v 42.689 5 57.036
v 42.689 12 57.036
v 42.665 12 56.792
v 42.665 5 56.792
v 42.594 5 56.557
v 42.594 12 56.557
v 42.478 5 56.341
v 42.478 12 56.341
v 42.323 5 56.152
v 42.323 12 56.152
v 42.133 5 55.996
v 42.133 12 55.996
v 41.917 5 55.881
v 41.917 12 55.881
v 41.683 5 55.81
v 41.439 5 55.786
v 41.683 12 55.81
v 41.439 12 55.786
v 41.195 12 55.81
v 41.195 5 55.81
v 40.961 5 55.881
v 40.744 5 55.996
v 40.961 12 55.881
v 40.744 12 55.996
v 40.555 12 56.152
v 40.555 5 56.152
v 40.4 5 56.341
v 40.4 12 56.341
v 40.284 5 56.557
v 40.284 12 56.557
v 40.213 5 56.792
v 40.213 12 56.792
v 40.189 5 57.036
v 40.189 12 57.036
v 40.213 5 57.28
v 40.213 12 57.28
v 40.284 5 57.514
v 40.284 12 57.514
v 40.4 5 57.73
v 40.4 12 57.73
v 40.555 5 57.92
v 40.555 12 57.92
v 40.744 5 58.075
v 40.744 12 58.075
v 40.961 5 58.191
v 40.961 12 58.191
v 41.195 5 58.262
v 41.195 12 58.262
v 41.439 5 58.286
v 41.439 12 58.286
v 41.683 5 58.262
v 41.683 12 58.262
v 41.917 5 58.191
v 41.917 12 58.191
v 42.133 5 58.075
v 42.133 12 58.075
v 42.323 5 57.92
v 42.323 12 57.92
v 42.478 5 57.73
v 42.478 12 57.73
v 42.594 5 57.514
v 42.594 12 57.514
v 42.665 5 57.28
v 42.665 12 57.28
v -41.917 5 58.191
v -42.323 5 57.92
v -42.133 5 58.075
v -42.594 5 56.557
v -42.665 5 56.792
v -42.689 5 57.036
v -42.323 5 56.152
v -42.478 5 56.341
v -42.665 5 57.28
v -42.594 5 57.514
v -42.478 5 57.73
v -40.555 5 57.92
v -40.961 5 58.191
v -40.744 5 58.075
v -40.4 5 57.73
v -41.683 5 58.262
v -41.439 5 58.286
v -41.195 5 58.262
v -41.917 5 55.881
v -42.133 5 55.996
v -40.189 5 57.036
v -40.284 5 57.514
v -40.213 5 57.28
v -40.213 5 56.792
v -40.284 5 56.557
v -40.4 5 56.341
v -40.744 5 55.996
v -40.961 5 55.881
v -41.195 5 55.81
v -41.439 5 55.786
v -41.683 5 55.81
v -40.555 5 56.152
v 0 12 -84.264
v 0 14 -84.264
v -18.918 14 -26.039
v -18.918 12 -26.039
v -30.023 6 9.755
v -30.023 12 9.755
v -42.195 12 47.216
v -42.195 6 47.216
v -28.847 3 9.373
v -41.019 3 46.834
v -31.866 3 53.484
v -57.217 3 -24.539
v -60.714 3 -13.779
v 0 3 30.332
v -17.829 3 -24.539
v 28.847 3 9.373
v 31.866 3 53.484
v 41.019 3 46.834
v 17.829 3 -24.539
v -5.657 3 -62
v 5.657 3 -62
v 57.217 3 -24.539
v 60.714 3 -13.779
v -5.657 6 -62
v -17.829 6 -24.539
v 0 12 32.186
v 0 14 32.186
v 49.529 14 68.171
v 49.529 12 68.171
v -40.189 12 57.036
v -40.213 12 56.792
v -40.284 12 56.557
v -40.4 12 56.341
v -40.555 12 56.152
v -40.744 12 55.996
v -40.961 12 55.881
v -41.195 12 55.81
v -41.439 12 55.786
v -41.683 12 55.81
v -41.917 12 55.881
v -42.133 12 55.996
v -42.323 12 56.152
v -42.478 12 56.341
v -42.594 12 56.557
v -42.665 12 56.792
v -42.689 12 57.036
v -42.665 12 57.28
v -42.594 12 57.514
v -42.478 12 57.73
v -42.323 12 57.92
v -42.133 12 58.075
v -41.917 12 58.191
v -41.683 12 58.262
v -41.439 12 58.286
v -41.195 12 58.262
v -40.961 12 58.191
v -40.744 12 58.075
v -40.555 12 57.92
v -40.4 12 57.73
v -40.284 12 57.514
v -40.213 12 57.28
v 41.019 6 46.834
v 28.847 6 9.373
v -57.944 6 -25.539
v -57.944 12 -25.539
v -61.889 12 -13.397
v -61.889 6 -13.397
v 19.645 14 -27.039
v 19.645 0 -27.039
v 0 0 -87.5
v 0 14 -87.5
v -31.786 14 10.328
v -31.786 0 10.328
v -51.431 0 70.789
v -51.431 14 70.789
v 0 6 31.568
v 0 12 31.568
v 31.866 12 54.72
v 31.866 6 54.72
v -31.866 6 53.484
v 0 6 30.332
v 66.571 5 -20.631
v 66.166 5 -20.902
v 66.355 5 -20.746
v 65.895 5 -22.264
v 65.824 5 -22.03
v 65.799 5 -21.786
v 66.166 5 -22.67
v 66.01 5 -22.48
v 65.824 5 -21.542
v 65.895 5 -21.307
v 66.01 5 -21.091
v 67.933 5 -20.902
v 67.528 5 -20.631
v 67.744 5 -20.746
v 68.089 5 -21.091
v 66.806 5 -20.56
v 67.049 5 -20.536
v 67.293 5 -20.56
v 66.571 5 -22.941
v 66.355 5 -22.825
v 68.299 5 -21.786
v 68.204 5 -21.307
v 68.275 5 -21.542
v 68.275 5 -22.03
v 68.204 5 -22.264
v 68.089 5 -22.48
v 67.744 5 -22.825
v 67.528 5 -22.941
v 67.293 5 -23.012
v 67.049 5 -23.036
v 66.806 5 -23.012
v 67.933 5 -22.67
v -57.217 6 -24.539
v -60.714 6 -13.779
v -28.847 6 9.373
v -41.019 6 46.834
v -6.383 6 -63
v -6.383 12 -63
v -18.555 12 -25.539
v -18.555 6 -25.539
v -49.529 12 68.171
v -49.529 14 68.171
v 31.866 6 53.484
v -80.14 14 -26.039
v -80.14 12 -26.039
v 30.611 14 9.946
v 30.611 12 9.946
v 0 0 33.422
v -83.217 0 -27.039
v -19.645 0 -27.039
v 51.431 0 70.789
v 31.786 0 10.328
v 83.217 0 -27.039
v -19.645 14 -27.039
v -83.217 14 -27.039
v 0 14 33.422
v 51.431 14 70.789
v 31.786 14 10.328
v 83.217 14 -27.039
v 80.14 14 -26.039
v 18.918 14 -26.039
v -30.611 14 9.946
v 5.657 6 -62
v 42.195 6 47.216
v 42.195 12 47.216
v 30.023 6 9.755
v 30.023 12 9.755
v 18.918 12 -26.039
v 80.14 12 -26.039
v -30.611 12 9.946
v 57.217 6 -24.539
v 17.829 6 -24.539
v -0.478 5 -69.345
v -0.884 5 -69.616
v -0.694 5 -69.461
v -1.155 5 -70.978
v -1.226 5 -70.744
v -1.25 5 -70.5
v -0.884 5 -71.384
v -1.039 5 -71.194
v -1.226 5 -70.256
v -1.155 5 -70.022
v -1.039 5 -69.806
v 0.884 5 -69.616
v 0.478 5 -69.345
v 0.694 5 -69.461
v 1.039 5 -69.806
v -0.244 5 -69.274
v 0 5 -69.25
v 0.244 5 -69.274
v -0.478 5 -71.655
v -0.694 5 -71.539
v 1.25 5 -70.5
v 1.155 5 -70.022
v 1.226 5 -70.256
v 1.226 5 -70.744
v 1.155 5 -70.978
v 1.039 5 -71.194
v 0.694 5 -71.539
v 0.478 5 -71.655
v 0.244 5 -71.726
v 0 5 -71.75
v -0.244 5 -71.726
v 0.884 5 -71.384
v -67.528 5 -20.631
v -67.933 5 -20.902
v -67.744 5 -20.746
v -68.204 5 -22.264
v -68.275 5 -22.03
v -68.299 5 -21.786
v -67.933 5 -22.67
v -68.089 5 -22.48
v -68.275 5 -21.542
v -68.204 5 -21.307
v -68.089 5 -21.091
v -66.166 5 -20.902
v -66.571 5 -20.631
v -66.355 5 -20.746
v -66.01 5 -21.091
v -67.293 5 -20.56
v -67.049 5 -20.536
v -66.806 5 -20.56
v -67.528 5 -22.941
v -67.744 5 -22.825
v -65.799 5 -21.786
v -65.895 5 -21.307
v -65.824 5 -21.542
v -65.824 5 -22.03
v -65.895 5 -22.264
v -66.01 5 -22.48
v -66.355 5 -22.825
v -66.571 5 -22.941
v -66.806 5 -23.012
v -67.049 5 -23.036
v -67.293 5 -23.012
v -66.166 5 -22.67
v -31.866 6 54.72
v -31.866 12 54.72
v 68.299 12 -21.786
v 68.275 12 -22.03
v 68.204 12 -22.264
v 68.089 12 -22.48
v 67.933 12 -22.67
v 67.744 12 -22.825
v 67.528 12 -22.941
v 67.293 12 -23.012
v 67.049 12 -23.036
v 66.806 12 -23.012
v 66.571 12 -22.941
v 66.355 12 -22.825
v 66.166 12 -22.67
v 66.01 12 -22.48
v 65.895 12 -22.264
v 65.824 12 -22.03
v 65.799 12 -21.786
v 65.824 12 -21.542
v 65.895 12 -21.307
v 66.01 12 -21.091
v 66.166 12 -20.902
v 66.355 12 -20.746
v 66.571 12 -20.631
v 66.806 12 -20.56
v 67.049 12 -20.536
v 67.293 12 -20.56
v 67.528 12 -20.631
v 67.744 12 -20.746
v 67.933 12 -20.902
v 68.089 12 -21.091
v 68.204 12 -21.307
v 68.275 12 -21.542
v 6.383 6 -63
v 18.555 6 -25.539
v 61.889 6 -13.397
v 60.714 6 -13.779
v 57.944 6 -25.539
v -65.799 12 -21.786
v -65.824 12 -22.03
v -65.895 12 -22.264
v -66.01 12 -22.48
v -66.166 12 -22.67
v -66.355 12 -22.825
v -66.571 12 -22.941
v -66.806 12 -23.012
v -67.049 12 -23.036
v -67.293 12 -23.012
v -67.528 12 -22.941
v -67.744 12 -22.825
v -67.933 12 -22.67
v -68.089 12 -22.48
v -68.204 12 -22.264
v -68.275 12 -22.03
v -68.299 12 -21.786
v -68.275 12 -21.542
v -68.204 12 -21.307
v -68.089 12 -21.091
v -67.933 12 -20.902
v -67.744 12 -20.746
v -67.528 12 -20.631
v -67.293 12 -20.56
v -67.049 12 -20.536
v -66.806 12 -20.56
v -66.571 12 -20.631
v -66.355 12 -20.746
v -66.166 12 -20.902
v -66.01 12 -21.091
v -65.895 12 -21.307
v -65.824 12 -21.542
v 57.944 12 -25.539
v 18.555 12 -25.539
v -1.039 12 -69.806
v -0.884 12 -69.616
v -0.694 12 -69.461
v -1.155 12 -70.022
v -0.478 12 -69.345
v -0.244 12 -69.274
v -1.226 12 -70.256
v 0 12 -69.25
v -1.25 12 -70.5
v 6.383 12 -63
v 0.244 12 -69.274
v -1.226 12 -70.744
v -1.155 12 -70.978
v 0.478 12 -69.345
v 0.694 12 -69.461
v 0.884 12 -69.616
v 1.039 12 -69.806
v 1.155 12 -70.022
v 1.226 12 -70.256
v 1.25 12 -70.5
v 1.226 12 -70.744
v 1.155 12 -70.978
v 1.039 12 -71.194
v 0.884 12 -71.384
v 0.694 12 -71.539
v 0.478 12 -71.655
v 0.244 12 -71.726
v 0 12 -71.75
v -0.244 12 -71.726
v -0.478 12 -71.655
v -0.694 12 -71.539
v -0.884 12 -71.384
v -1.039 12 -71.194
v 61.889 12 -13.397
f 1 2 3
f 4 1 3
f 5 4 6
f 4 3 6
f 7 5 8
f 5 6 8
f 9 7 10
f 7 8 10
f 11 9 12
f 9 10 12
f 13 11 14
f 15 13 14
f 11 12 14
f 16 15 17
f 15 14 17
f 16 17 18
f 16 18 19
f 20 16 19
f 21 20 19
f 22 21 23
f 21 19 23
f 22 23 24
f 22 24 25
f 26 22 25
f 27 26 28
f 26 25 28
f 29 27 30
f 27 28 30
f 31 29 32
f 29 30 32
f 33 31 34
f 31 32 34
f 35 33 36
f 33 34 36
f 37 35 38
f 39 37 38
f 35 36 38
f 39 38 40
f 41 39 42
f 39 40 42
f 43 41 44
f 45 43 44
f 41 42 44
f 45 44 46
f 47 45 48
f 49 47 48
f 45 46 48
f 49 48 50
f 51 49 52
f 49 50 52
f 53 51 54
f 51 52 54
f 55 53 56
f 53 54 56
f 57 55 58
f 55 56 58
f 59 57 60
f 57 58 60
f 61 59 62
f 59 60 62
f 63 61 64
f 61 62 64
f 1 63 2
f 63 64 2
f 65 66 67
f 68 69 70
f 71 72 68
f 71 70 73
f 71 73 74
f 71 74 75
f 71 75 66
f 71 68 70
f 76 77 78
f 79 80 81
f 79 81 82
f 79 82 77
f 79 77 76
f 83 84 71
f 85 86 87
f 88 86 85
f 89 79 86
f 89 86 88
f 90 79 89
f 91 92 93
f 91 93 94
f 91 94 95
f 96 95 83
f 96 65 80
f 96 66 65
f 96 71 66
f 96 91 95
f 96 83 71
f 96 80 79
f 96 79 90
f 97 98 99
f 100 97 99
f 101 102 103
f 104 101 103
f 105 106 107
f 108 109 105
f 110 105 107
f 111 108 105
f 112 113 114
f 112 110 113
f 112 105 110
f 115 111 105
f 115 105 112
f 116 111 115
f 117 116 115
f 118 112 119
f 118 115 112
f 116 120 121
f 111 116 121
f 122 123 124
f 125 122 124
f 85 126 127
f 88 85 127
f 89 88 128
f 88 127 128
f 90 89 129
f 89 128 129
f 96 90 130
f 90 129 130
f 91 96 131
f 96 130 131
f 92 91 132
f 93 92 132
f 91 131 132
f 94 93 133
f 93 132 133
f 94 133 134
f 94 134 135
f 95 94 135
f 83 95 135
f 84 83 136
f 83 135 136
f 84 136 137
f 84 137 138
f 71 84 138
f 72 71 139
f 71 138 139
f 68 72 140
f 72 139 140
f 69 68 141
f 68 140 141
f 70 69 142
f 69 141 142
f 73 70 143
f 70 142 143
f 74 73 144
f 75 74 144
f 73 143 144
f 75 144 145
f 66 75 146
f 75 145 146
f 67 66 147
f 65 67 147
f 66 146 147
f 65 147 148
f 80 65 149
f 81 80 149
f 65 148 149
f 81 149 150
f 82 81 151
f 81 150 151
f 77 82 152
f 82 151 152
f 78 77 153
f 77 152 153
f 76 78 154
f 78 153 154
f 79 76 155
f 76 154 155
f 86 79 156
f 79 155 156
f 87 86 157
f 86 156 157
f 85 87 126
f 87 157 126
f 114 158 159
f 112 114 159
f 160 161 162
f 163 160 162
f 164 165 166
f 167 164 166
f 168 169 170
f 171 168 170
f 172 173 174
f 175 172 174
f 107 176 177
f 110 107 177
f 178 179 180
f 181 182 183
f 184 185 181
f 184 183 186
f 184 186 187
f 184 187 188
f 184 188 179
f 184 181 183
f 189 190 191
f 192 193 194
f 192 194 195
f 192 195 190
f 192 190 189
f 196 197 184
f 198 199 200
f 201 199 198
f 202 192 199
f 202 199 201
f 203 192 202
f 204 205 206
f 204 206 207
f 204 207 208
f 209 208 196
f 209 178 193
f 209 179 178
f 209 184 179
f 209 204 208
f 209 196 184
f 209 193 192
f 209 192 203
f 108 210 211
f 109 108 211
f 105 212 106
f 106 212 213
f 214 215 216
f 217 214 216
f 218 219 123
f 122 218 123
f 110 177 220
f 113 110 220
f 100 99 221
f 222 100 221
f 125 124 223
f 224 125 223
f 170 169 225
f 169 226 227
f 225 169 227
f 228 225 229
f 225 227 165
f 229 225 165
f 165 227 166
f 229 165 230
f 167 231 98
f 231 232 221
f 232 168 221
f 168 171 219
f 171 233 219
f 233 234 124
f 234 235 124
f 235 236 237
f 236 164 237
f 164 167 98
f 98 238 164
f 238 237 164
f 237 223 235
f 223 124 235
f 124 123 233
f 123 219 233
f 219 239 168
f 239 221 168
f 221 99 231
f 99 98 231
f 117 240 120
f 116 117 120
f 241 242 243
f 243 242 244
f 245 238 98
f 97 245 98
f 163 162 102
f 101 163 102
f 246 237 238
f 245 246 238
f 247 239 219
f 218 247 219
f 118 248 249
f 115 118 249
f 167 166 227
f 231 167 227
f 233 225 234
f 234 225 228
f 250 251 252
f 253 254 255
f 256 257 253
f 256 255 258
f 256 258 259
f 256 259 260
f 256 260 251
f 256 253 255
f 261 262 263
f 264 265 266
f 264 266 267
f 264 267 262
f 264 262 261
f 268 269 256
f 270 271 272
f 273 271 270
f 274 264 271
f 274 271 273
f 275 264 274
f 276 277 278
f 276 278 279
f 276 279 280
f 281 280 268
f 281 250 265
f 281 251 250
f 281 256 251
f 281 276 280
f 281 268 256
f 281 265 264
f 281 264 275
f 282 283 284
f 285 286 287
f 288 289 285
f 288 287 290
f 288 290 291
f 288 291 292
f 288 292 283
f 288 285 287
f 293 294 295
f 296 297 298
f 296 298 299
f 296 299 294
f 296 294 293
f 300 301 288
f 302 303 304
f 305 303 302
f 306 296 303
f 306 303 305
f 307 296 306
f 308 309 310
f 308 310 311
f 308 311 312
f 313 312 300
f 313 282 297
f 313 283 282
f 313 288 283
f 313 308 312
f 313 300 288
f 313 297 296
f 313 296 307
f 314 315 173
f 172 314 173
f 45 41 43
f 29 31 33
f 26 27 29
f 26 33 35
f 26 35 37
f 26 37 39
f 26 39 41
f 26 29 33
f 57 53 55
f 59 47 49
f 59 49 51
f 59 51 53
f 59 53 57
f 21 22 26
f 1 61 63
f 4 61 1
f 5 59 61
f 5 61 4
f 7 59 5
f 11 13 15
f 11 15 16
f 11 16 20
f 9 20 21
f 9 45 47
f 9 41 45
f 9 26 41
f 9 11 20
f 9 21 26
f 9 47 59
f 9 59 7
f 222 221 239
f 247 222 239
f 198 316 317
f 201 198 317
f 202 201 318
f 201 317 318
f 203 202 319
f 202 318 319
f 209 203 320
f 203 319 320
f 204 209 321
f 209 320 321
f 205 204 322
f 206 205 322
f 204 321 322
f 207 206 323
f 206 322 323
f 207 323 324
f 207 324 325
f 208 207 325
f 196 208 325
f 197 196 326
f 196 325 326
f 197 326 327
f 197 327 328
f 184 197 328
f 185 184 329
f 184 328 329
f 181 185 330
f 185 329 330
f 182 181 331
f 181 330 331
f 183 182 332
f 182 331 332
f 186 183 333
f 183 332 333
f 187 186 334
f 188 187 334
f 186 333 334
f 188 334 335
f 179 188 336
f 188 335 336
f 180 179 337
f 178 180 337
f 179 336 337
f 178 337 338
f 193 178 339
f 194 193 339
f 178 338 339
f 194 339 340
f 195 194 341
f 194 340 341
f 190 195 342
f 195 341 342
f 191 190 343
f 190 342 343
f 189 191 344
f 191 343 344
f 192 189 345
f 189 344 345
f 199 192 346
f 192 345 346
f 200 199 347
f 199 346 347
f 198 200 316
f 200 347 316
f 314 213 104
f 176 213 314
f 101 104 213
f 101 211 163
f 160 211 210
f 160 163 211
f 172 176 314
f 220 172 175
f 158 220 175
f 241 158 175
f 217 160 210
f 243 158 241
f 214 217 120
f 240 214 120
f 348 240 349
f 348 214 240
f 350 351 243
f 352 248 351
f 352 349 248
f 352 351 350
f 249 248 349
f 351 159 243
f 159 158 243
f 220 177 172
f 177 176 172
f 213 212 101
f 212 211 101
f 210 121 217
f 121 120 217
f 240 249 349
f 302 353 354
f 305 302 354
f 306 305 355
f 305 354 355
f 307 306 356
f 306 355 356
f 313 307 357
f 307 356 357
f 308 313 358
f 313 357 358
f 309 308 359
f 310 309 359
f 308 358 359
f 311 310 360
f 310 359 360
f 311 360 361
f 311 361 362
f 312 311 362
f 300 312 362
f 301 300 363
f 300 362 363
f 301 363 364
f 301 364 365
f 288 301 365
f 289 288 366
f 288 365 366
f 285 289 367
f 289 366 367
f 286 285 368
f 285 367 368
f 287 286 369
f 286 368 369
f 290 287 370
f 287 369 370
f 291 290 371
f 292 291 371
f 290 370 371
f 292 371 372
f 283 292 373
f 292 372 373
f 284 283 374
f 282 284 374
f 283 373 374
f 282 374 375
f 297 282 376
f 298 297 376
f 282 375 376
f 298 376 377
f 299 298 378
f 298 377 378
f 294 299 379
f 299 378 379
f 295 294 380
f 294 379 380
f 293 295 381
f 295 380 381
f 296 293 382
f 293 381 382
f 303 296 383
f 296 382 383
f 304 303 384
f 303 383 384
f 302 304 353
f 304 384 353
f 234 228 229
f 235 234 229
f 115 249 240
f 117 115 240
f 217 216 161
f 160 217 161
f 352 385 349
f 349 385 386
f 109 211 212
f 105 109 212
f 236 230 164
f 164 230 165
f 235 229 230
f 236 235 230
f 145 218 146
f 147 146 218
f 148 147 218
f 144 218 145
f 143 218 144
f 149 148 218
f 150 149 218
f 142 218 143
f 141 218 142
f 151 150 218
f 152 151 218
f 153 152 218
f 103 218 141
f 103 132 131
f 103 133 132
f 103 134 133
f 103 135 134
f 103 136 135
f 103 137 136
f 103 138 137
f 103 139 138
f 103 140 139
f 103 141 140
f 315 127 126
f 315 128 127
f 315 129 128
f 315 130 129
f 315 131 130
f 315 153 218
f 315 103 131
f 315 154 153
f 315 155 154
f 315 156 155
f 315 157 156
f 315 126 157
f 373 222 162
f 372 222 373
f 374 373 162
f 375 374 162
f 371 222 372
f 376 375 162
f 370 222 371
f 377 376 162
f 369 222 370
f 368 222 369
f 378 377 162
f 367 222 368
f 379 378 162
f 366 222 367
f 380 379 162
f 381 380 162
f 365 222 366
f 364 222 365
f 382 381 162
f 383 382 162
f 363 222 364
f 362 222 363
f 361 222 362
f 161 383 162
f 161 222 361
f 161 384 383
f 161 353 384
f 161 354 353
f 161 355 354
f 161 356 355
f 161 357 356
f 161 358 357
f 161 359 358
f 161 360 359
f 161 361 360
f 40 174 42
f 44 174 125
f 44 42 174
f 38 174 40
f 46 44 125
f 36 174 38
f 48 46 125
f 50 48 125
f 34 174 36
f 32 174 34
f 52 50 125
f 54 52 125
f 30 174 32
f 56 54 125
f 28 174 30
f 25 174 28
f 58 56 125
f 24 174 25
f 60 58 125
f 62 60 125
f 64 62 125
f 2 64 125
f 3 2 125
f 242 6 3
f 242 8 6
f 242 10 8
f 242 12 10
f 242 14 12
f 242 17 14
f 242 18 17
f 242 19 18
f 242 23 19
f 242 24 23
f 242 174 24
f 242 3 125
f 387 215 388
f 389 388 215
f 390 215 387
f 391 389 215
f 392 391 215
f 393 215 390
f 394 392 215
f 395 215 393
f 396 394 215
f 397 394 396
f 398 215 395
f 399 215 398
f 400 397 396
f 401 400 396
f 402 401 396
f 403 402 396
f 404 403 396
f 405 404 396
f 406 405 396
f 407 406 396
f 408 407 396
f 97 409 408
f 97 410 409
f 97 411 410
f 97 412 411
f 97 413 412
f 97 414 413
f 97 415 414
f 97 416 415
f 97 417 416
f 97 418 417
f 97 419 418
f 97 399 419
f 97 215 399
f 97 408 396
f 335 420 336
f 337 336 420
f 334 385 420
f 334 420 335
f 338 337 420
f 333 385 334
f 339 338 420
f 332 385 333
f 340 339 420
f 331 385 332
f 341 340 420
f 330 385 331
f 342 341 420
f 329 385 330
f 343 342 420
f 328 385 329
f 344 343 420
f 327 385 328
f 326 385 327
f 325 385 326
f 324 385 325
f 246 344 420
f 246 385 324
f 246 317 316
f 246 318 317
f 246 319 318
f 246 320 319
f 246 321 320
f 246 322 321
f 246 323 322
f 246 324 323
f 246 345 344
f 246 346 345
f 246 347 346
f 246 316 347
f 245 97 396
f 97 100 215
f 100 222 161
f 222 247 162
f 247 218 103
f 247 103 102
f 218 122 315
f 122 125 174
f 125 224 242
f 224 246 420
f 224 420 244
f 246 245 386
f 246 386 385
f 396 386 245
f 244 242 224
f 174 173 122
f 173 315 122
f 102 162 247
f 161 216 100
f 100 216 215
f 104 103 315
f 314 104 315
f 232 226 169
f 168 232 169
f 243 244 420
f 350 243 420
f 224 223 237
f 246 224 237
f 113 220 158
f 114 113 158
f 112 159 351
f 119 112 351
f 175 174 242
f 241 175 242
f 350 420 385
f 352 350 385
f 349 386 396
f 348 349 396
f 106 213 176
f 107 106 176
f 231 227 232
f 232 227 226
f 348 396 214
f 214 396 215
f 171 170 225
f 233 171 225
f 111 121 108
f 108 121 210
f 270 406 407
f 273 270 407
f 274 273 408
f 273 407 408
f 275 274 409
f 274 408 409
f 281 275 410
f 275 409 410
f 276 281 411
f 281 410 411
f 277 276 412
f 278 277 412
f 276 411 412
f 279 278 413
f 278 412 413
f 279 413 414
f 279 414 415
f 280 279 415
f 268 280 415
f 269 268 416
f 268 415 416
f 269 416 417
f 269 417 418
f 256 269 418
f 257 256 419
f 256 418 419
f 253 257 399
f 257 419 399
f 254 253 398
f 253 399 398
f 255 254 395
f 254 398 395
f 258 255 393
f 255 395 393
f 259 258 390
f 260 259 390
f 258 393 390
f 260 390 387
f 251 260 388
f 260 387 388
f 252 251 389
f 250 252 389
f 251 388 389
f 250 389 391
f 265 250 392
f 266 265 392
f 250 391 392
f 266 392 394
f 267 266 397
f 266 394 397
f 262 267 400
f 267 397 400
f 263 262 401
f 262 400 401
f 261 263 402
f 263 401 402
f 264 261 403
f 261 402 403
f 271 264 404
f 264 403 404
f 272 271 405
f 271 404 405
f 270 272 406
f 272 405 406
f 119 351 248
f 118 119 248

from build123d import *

# Parameters (mm, degrees)
SALIENTE_EXTRUIR1_DEPTH = 14
CORTAR_EXTRUIR1_DEPTH   = 11
CORTAR_EXTRUIR2_DEPTH   = 8
CROQUIS4_OUTSIDE_W      = 214.456
CROQUIS4_OUTSIDE_H      = 206.311
CORTAR_EXTRUIR4_DEPTH   = 2
CROQUIS6_R              = 1.25
CORTAR_EXTRUIR6_DEPTH   = 7


with BuildPart() as part:
    # Croquis1 → Saliente-Extruir1 (new body)
    with BuildSketch(Plane(origin=(0, 0, 0), x_dir=(1, 0, 0), z_dir=(0, 1, 0))):
        Polygon((0, 87.5), (-19.644973975, 27.038987008), (-83.217445176, 27.038987008), (-31.7862356, -10.327974016), (-51.431209576, -70.788987008), (0, -33.422025984), (51.431209576, -70.788987008), (31.7862356, -10.327974016), (83.217445176, 27.038987008), (19.644973975, 27.038987008), align=None)
    extrude(amount=SALIENTE_EXTRUIR1_DEPTH)

    # Croquis2 → Cortar-Extruir1 (cut)
    with BuildSketch(Plane(origin=(0, 14, 0), x_dir=(1, 0, 0), z_dir=(0, 1, 0))):
        Polygon((31.866240983, -53.484035323), (41.019130301, -46.83407198), (28.847309339, -9.373058987), (60.713550322, 13.779120295), (57.217457698, 24.538987008), (17.828617655, 24.538987008), (5.656796693, 62), (-5.656796693, 62), (-17.828617655, 24.538987008), (-57.217457698, 24.538987008), (-60.713550322, 13.779120295), (-28.847309339, -9.373058987), (-41.019130301, -46.83407198), (-31.866240983, -53.484035323), (0, -30.331856041), align=None)
    extrude(amount=-CORTAR_EXTRUIR1_DEPTH, mode=Mode.SUBTRACT)

    # Croquis3 → Cortar-Extruir2 (cut)
    with BuildSketch(Plane(origin=(0, 14, 0), x_dir=(1, 0, 0), z_dir=(0, 1, 0))):
        Polygon((57.944000226, 25.538987008), (18.555160183, 25.538987008), (6.383339221, 63), (-6.383339221, 63), (-18.555160183, 25.538987008), (-57.944000226, 25.538987008), (-61.889120827, 13.397154283), (-30.022879843, -9.755024999), (-42.194700805, -47.216037991), (-31.866240983, -54.7201033), (0, -31.567924018), (31.866240983, -54.7201033), (42.194700805, -47.216037991), (30.022879843, -9.755024999), (61.889120827, 13.397154283), align=None)
        Polygon((57.217457698, 24.538987008), (17.828617655, 24.538987008), (5.656796693, 62), (-5.656796693, 62), (-17.828617655, 24.538987008), (-57.217457698, 24.538987008), (-60.713550322, 13.779120295), (-28.847309339, -9.373058987), (-41.019130301, -46.83407198), (-31.866240983, -53.484035323), (0, -30.331856041), (31.866240983, -53.484035323), (41.019130301, -46.83407198), (28.847309339, -9.373058987), (60.713550322, 13.779120295), align=None, mode=Mode.SUBTRACT)
    extrude(amount=-CORTAR_EXTRUIR2_DEPTH, mode=Mode.SUBTRACT)

    # Croquis4 outside → Cortar-Extruir4 (cut)
    with BuildSketch(Plane(origin=(0, 14, 0), x_dir=(1, 0, 0), z_dir=(0, 1, 0))):
        with Locations((0, 8.3555)):
            Rectangle(CROQUIS4_OUTSIDE_W, CROQUIS4_OUTSIDE_H)
        Polygon((19.644973975, 27.038987008), (0, 87.5), (-19.644973975, 27.038987008), (-83.217445176, 27.038987008), (-31.7862356, -10.327974016), (-51.431209576, -70.788987008), (0, -33.422025984), (51.431209576, -70.788987008), (31.7862356, -10.327974016), (83.217445176, 27.038987008), align=None, mode=Mode.SUBTRACT)
        Polygon((18.918431447, 26.038987008), (0, 84.263932023), (-18.918431447, 26.038987008), (-80.139761639, 26.038987008), (-30.610665096, -9.946008004), (-49.529096543, -68.170953019), (0, -32.185958007), (49.529096543, -68.170953019), (30.610665096, -9.946008004), (80.139761639, 26.038987008), align=None)
    extrude(amount=-CORTAR_EXTRUIR4_DEPTH, mode=Mode.SUBTRACT)

    # Croquis6 → Cortar-Extruir6 (cut)
    with BuildSketch(Plane(origin=(0, 12, 0), x_dir=(1, 0, 0), z_dir=(0, 1, 0))):
        with Locations((-67.049484399, 21.785698103)):
            Circle(CROQUIS6_R)
        with Locations((0, 70.5)):
            Circle(CROQUIS6_R)
        with Locations((67.049484399, 21.785698103)):
            Circle(CROQUIS6_R)
        with Locations((41.438860287, -57.035698103)):
            Circle(CROQUIS6_R)
        with Locations((-41.438860287, -57.035698103)):
            Circle(CROQUIS6_R)
    extrude(amount=-CORTAR_EXTRUIR6_DEPTH, mode=Mode.SUBTRACT)


solid = part.part
